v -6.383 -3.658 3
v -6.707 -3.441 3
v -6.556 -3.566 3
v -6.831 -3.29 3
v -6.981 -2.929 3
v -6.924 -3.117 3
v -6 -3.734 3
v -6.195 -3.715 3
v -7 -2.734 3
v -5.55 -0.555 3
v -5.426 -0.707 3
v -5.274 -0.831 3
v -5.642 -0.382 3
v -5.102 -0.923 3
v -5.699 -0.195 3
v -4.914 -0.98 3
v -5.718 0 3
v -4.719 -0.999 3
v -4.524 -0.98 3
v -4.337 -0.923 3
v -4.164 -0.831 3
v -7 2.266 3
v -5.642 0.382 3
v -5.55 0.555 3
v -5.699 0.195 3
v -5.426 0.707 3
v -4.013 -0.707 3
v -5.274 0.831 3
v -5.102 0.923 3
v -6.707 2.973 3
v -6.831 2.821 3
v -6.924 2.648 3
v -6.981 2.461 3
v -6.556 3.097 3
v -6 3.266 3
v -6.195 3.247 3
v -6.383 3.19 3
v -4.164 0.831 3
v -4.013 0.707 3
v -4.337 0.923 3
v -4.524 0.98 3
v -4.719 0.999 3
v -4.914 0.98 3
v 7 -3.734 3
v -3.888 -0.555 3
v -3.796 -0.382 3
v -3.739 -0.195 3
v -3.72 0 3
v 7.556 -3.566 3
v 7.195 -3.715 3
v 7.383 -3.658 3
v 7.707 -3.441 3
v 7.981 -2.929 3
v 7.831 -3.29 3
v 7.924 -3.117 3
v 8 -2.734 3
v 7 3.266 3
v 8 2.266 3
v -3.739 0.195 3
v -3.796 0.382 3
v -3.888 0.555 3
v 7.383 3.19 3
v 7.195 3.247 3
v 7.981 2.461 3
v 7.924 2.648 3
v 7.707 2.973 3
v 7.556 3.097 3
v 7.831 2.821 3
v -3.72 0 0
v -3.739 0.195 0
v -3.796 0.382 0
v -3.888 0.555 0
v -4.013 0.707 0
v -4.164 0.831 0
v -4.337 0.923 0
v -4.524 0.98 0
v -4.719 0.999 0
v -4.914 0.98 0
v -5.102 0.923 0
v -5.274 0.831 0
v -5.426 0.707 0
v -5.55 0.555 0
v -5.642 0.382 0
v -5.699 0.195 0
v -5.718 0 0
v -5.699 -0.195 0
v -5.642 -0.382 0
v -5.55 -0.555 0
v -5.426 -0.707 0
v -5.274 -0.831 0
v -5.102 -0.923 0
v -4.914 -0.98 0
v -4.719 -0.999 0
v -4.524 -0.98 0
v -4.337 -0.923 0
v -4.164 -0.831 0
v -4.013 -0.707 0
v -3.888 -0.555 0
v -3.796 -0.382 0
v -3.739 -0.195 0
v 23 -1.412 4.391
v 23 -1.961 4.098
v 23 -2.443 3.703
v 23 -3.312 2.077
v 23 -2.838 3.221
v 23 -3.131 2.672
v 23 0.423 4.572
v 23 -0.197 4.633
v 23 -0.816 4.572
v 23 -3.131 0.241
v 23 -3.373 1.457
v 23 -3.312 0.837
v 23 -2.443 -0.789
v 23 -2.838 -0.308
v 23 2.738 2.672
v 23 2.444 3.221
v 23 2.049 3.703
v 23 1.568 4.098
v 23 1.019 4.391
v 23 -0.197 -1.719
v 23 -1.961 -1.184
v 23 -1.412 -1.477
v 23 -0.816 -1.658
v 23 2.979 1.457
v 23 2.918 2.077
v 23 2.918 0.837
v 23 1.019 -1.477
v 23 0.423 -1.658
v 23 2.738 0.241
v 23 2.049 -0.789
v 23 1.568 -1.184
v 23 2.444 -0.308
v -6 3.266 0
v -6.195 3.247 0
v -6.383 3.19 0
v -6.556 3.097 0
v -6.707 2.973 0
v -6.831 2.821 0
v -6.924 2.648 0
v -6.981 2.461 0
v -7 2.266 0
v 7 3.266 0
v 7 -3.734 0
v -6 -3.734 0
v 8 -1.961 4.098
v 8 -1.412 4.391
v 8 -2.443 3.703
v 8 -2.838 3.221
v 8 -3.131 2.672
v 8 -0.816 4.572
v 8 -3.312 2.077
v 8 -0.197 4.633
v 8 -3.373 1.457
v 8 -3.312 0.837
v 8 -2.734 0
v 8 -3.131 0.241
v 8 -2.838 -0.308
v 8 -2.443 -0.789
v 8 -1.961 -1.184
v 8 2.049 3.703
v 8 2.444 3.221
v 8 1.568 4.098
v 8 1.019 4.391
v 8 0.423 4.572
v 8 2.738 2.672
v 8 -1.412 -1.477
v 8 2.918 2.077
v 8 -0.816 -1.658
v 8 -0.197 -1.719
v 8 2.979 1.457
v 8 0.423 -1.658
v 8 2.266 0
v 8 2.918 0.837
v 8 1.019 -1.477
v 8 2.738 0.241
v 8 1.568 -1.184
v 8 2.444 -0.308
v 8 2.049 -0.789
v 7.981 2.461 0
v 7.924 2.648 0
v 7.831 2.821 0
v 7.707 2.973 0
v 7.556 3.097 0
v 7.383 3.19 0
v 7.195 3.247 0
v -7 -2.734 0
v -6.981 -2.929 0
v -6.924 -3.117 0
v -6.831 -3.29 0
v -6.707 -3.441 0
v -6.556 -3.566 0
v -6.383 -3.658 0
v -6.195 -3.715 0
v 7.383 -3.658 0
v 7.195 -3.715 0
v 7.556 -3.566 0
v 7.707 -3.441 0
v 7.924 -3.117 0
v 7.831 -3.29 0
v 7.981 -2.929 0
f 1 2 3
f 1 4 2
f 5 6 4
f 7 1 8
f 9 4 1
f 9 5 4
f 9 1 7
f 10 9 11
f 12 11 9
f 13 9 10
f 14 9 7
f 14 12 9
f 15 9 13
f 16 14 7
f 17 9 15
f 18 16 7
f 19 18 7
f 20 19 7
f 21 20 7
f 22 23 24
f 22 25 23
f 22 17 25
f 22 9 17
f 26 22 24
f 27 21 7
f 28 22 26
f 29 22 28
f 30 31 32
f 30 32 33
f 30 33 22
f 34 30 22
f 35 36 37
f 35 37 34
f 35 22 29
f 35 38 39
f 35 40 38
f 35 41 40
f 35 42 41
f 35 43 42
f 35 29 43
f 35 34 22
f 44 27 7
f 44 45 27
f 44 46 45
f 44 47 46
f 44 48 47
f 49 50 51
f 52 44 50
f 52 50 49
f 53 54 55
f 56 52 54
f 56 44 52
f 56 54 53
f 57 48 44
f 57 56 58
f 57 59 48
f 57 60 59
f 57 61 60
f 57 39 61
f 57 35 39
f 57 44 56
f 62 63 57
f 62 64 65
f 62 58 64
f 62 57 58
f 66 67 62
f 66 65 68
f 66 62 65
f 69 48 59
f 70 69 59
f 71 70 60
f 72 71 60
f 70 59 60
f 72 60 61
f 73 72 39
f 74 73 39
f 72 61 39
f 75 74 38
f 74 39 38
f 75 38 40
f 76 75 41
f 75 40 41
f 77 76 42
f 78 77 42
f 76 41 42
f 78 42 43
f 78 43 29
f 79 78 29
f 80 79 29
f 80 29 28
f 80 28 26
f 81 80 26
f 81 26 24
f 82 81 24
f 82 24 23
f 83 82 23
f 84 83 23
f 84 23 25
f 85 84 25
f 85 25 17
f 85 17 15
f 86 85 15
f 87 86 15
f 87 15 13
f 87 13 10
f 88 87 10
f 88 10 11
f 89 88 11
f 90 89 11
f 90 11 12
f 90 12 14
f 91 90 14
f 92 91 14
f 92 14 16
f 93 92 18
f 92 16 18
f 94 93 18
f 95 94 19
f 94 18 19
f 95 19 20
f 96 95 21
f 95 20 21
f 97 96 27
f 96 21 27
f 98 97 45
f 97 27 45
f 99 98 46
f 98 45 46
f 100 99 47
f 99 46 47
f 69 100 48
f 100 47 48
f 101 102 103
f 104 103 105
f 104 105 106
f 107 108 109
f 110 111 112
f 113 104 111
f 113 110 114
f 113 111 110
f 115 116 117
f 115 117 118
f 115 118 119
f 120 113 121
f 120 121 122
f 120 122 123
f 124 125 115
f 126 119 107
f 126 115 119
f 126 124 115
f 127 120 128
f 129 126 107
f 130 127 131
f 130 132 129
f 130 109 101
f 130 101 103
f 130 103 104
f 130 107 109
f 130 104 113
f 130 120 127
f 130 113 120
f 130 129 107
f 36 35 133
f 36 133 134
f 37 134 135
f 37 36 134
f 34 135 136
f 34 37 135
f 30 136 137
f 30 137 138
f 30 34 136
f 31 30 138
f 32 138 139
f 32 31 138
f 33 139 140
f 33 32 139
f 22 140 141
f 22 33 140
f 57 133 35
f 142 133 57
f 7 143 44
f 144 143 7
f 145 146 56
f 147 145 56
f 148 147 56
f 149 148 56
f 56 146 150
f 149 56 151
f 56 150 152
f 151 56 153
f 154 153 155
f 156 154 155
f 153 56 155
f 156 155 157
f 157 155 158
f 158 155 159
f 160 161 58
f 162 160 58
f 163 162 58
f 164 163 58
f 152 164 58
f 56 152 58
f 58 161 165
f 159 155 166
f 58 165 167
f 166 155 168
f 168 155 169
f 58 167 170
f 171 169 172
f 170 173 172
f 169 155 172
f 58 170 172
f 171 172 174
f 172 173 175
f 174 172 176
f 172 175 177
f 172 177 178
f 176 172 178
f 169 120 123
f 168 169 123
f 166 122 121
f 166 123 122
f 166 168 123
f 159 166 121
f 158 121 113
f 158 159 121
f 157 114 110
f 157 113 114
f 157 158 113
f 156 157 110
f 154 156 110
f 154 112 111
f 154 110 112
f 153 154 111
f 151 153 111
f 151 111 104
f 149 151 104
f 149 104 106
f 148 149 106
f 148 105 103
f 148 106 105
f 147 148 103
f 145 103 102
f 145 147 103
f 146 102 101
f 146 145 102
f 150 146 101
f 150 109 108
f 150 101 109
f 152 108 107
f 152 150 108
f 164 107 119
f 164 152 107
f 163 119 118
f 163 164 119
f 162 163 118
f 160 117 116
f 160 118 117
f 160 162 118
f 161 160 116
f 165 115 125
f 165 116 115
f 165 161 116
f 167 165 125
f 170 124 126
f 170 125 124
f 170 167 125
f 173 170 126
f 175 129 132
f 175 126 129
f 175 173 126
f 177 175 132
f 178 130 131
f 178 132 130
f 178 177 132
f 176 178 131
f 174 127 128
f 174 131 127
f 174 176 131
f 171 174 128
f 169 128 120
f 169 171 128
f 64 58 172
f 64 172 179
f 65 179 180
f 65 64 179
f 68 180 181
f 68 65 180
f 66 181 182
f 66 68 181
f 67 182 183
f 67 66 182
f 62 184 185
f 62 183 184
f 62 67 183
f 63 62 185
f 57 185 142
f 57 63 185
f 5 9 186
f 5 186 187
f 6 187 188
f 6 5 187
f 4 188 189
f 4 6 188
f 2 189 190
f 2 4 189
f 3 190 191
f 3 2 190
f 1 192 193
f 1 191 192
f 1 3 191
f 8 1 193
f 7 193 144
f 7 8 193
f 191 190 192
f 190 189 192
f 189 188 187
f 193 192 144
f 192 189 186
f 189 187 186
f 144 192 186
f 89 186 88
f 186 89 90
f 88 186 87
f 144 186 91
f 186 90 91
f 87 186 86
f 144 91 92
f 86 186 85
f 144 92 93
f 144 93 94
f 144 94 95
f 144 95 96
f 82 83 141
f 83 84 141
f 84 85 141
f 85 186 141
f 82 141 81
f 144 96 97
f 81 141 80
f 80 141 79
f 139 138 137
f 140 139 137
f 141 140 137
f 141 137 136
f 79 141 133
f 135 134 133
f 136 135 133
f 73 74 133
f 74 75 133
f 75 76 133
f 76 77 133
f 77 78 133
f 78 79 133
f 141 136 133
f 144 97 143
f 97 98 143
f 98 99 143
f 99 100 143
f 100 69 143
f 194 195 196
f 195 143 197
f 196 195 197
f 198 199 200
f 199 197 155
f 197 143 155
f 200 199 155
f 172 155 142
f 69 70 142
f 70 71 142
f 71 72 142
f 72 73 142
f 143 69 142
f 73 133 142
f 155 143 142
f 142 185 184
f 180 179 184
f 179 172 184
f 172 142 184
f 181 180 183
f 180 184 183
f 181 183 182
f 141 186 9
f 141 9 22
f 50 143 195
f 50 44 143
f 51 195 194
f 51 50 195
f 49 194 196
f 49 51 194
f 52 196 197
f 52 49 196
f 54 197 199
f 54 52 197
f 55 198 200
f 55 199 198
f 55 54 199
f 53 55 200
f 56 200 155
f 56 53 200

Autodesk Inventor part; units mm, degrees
ref_plane "YZ Plane" through (0, 0, 0) normal (1, 0, 0) x (0, 1, 0)
ref_plane "XZ Plane" through (0, 0, 0) normal (0, 1, 0) x (-1, 0, 0)
sketch "Sketch1" plane through (0, 0, 0) normal (0, 0, 1) x (1, 0, 0)
  line L0 (-7, -0.2342) -> (-7, 3.2658)
  line L1 (-7, 3.2658) -> (8, 3.2658)
  line L2 (8, 3.2658) -> (8, -3.7342)
  line L3 (8, -3.7342) -> (-7, -3.7342)
  line L4 (-7, -3.7342) -> (-7, -0.2342)
  point P0 (0, 0)
  dimension "d0" = 15
  dimension "d1" = 15
  dimension "d2" = 7
  dimension "d3" = 3.5
  dimension "d4" = 7
extrude "Extrusion1" add sketch "Sketch1" along normal blind 3
fillet "Fillet1" radius 1 1 edges at (8, 3.2658, 1.5)
fillet "Fillet2" radius 1 1 edges at (8, -3.7342, 1.5)
fillet "Fillet3" radius 1 2 edges at (-7, 3.2658, 1.5) (-7, -3.7342, 1.5)
sketch "Sketch2" plane through (0, 0, 3) normal (0, 0, 1) x (1, 0, 0)
  circle A0 centre (-4.7192, 0) radius 0.9993
  point P0 (0, 0)
extrude "Extrusion2" cut sketch "Sketch2" against normal blind 3
sketch "Sketch3" plane through (8, 2.2658, 3) normal (1, 0, 0) x (0, 0, -1)
  circle A0 centre (1.5431, -2.4625) radius 3.1761
  point P0 (3, -2.2658)
extrude "Extrusion3" add sketch "Sketch3" along normal blind 15
sketch "Sketch4" plane through (23, -0.1967, 1.4569) normal (1, 0, 0) x (0, 0, -1)
  point P0 (1.4569, 0.1967)
sketch "Sketch5" plane through (0, 0, 0) normal (0, 0, 1) x (1, 0, 0)
  point P0 (0, 0)
thread "Thread1" size "M7x1" class "6g" standard "ANSI Metric M Profile" length 15
properties part number "end factor"
